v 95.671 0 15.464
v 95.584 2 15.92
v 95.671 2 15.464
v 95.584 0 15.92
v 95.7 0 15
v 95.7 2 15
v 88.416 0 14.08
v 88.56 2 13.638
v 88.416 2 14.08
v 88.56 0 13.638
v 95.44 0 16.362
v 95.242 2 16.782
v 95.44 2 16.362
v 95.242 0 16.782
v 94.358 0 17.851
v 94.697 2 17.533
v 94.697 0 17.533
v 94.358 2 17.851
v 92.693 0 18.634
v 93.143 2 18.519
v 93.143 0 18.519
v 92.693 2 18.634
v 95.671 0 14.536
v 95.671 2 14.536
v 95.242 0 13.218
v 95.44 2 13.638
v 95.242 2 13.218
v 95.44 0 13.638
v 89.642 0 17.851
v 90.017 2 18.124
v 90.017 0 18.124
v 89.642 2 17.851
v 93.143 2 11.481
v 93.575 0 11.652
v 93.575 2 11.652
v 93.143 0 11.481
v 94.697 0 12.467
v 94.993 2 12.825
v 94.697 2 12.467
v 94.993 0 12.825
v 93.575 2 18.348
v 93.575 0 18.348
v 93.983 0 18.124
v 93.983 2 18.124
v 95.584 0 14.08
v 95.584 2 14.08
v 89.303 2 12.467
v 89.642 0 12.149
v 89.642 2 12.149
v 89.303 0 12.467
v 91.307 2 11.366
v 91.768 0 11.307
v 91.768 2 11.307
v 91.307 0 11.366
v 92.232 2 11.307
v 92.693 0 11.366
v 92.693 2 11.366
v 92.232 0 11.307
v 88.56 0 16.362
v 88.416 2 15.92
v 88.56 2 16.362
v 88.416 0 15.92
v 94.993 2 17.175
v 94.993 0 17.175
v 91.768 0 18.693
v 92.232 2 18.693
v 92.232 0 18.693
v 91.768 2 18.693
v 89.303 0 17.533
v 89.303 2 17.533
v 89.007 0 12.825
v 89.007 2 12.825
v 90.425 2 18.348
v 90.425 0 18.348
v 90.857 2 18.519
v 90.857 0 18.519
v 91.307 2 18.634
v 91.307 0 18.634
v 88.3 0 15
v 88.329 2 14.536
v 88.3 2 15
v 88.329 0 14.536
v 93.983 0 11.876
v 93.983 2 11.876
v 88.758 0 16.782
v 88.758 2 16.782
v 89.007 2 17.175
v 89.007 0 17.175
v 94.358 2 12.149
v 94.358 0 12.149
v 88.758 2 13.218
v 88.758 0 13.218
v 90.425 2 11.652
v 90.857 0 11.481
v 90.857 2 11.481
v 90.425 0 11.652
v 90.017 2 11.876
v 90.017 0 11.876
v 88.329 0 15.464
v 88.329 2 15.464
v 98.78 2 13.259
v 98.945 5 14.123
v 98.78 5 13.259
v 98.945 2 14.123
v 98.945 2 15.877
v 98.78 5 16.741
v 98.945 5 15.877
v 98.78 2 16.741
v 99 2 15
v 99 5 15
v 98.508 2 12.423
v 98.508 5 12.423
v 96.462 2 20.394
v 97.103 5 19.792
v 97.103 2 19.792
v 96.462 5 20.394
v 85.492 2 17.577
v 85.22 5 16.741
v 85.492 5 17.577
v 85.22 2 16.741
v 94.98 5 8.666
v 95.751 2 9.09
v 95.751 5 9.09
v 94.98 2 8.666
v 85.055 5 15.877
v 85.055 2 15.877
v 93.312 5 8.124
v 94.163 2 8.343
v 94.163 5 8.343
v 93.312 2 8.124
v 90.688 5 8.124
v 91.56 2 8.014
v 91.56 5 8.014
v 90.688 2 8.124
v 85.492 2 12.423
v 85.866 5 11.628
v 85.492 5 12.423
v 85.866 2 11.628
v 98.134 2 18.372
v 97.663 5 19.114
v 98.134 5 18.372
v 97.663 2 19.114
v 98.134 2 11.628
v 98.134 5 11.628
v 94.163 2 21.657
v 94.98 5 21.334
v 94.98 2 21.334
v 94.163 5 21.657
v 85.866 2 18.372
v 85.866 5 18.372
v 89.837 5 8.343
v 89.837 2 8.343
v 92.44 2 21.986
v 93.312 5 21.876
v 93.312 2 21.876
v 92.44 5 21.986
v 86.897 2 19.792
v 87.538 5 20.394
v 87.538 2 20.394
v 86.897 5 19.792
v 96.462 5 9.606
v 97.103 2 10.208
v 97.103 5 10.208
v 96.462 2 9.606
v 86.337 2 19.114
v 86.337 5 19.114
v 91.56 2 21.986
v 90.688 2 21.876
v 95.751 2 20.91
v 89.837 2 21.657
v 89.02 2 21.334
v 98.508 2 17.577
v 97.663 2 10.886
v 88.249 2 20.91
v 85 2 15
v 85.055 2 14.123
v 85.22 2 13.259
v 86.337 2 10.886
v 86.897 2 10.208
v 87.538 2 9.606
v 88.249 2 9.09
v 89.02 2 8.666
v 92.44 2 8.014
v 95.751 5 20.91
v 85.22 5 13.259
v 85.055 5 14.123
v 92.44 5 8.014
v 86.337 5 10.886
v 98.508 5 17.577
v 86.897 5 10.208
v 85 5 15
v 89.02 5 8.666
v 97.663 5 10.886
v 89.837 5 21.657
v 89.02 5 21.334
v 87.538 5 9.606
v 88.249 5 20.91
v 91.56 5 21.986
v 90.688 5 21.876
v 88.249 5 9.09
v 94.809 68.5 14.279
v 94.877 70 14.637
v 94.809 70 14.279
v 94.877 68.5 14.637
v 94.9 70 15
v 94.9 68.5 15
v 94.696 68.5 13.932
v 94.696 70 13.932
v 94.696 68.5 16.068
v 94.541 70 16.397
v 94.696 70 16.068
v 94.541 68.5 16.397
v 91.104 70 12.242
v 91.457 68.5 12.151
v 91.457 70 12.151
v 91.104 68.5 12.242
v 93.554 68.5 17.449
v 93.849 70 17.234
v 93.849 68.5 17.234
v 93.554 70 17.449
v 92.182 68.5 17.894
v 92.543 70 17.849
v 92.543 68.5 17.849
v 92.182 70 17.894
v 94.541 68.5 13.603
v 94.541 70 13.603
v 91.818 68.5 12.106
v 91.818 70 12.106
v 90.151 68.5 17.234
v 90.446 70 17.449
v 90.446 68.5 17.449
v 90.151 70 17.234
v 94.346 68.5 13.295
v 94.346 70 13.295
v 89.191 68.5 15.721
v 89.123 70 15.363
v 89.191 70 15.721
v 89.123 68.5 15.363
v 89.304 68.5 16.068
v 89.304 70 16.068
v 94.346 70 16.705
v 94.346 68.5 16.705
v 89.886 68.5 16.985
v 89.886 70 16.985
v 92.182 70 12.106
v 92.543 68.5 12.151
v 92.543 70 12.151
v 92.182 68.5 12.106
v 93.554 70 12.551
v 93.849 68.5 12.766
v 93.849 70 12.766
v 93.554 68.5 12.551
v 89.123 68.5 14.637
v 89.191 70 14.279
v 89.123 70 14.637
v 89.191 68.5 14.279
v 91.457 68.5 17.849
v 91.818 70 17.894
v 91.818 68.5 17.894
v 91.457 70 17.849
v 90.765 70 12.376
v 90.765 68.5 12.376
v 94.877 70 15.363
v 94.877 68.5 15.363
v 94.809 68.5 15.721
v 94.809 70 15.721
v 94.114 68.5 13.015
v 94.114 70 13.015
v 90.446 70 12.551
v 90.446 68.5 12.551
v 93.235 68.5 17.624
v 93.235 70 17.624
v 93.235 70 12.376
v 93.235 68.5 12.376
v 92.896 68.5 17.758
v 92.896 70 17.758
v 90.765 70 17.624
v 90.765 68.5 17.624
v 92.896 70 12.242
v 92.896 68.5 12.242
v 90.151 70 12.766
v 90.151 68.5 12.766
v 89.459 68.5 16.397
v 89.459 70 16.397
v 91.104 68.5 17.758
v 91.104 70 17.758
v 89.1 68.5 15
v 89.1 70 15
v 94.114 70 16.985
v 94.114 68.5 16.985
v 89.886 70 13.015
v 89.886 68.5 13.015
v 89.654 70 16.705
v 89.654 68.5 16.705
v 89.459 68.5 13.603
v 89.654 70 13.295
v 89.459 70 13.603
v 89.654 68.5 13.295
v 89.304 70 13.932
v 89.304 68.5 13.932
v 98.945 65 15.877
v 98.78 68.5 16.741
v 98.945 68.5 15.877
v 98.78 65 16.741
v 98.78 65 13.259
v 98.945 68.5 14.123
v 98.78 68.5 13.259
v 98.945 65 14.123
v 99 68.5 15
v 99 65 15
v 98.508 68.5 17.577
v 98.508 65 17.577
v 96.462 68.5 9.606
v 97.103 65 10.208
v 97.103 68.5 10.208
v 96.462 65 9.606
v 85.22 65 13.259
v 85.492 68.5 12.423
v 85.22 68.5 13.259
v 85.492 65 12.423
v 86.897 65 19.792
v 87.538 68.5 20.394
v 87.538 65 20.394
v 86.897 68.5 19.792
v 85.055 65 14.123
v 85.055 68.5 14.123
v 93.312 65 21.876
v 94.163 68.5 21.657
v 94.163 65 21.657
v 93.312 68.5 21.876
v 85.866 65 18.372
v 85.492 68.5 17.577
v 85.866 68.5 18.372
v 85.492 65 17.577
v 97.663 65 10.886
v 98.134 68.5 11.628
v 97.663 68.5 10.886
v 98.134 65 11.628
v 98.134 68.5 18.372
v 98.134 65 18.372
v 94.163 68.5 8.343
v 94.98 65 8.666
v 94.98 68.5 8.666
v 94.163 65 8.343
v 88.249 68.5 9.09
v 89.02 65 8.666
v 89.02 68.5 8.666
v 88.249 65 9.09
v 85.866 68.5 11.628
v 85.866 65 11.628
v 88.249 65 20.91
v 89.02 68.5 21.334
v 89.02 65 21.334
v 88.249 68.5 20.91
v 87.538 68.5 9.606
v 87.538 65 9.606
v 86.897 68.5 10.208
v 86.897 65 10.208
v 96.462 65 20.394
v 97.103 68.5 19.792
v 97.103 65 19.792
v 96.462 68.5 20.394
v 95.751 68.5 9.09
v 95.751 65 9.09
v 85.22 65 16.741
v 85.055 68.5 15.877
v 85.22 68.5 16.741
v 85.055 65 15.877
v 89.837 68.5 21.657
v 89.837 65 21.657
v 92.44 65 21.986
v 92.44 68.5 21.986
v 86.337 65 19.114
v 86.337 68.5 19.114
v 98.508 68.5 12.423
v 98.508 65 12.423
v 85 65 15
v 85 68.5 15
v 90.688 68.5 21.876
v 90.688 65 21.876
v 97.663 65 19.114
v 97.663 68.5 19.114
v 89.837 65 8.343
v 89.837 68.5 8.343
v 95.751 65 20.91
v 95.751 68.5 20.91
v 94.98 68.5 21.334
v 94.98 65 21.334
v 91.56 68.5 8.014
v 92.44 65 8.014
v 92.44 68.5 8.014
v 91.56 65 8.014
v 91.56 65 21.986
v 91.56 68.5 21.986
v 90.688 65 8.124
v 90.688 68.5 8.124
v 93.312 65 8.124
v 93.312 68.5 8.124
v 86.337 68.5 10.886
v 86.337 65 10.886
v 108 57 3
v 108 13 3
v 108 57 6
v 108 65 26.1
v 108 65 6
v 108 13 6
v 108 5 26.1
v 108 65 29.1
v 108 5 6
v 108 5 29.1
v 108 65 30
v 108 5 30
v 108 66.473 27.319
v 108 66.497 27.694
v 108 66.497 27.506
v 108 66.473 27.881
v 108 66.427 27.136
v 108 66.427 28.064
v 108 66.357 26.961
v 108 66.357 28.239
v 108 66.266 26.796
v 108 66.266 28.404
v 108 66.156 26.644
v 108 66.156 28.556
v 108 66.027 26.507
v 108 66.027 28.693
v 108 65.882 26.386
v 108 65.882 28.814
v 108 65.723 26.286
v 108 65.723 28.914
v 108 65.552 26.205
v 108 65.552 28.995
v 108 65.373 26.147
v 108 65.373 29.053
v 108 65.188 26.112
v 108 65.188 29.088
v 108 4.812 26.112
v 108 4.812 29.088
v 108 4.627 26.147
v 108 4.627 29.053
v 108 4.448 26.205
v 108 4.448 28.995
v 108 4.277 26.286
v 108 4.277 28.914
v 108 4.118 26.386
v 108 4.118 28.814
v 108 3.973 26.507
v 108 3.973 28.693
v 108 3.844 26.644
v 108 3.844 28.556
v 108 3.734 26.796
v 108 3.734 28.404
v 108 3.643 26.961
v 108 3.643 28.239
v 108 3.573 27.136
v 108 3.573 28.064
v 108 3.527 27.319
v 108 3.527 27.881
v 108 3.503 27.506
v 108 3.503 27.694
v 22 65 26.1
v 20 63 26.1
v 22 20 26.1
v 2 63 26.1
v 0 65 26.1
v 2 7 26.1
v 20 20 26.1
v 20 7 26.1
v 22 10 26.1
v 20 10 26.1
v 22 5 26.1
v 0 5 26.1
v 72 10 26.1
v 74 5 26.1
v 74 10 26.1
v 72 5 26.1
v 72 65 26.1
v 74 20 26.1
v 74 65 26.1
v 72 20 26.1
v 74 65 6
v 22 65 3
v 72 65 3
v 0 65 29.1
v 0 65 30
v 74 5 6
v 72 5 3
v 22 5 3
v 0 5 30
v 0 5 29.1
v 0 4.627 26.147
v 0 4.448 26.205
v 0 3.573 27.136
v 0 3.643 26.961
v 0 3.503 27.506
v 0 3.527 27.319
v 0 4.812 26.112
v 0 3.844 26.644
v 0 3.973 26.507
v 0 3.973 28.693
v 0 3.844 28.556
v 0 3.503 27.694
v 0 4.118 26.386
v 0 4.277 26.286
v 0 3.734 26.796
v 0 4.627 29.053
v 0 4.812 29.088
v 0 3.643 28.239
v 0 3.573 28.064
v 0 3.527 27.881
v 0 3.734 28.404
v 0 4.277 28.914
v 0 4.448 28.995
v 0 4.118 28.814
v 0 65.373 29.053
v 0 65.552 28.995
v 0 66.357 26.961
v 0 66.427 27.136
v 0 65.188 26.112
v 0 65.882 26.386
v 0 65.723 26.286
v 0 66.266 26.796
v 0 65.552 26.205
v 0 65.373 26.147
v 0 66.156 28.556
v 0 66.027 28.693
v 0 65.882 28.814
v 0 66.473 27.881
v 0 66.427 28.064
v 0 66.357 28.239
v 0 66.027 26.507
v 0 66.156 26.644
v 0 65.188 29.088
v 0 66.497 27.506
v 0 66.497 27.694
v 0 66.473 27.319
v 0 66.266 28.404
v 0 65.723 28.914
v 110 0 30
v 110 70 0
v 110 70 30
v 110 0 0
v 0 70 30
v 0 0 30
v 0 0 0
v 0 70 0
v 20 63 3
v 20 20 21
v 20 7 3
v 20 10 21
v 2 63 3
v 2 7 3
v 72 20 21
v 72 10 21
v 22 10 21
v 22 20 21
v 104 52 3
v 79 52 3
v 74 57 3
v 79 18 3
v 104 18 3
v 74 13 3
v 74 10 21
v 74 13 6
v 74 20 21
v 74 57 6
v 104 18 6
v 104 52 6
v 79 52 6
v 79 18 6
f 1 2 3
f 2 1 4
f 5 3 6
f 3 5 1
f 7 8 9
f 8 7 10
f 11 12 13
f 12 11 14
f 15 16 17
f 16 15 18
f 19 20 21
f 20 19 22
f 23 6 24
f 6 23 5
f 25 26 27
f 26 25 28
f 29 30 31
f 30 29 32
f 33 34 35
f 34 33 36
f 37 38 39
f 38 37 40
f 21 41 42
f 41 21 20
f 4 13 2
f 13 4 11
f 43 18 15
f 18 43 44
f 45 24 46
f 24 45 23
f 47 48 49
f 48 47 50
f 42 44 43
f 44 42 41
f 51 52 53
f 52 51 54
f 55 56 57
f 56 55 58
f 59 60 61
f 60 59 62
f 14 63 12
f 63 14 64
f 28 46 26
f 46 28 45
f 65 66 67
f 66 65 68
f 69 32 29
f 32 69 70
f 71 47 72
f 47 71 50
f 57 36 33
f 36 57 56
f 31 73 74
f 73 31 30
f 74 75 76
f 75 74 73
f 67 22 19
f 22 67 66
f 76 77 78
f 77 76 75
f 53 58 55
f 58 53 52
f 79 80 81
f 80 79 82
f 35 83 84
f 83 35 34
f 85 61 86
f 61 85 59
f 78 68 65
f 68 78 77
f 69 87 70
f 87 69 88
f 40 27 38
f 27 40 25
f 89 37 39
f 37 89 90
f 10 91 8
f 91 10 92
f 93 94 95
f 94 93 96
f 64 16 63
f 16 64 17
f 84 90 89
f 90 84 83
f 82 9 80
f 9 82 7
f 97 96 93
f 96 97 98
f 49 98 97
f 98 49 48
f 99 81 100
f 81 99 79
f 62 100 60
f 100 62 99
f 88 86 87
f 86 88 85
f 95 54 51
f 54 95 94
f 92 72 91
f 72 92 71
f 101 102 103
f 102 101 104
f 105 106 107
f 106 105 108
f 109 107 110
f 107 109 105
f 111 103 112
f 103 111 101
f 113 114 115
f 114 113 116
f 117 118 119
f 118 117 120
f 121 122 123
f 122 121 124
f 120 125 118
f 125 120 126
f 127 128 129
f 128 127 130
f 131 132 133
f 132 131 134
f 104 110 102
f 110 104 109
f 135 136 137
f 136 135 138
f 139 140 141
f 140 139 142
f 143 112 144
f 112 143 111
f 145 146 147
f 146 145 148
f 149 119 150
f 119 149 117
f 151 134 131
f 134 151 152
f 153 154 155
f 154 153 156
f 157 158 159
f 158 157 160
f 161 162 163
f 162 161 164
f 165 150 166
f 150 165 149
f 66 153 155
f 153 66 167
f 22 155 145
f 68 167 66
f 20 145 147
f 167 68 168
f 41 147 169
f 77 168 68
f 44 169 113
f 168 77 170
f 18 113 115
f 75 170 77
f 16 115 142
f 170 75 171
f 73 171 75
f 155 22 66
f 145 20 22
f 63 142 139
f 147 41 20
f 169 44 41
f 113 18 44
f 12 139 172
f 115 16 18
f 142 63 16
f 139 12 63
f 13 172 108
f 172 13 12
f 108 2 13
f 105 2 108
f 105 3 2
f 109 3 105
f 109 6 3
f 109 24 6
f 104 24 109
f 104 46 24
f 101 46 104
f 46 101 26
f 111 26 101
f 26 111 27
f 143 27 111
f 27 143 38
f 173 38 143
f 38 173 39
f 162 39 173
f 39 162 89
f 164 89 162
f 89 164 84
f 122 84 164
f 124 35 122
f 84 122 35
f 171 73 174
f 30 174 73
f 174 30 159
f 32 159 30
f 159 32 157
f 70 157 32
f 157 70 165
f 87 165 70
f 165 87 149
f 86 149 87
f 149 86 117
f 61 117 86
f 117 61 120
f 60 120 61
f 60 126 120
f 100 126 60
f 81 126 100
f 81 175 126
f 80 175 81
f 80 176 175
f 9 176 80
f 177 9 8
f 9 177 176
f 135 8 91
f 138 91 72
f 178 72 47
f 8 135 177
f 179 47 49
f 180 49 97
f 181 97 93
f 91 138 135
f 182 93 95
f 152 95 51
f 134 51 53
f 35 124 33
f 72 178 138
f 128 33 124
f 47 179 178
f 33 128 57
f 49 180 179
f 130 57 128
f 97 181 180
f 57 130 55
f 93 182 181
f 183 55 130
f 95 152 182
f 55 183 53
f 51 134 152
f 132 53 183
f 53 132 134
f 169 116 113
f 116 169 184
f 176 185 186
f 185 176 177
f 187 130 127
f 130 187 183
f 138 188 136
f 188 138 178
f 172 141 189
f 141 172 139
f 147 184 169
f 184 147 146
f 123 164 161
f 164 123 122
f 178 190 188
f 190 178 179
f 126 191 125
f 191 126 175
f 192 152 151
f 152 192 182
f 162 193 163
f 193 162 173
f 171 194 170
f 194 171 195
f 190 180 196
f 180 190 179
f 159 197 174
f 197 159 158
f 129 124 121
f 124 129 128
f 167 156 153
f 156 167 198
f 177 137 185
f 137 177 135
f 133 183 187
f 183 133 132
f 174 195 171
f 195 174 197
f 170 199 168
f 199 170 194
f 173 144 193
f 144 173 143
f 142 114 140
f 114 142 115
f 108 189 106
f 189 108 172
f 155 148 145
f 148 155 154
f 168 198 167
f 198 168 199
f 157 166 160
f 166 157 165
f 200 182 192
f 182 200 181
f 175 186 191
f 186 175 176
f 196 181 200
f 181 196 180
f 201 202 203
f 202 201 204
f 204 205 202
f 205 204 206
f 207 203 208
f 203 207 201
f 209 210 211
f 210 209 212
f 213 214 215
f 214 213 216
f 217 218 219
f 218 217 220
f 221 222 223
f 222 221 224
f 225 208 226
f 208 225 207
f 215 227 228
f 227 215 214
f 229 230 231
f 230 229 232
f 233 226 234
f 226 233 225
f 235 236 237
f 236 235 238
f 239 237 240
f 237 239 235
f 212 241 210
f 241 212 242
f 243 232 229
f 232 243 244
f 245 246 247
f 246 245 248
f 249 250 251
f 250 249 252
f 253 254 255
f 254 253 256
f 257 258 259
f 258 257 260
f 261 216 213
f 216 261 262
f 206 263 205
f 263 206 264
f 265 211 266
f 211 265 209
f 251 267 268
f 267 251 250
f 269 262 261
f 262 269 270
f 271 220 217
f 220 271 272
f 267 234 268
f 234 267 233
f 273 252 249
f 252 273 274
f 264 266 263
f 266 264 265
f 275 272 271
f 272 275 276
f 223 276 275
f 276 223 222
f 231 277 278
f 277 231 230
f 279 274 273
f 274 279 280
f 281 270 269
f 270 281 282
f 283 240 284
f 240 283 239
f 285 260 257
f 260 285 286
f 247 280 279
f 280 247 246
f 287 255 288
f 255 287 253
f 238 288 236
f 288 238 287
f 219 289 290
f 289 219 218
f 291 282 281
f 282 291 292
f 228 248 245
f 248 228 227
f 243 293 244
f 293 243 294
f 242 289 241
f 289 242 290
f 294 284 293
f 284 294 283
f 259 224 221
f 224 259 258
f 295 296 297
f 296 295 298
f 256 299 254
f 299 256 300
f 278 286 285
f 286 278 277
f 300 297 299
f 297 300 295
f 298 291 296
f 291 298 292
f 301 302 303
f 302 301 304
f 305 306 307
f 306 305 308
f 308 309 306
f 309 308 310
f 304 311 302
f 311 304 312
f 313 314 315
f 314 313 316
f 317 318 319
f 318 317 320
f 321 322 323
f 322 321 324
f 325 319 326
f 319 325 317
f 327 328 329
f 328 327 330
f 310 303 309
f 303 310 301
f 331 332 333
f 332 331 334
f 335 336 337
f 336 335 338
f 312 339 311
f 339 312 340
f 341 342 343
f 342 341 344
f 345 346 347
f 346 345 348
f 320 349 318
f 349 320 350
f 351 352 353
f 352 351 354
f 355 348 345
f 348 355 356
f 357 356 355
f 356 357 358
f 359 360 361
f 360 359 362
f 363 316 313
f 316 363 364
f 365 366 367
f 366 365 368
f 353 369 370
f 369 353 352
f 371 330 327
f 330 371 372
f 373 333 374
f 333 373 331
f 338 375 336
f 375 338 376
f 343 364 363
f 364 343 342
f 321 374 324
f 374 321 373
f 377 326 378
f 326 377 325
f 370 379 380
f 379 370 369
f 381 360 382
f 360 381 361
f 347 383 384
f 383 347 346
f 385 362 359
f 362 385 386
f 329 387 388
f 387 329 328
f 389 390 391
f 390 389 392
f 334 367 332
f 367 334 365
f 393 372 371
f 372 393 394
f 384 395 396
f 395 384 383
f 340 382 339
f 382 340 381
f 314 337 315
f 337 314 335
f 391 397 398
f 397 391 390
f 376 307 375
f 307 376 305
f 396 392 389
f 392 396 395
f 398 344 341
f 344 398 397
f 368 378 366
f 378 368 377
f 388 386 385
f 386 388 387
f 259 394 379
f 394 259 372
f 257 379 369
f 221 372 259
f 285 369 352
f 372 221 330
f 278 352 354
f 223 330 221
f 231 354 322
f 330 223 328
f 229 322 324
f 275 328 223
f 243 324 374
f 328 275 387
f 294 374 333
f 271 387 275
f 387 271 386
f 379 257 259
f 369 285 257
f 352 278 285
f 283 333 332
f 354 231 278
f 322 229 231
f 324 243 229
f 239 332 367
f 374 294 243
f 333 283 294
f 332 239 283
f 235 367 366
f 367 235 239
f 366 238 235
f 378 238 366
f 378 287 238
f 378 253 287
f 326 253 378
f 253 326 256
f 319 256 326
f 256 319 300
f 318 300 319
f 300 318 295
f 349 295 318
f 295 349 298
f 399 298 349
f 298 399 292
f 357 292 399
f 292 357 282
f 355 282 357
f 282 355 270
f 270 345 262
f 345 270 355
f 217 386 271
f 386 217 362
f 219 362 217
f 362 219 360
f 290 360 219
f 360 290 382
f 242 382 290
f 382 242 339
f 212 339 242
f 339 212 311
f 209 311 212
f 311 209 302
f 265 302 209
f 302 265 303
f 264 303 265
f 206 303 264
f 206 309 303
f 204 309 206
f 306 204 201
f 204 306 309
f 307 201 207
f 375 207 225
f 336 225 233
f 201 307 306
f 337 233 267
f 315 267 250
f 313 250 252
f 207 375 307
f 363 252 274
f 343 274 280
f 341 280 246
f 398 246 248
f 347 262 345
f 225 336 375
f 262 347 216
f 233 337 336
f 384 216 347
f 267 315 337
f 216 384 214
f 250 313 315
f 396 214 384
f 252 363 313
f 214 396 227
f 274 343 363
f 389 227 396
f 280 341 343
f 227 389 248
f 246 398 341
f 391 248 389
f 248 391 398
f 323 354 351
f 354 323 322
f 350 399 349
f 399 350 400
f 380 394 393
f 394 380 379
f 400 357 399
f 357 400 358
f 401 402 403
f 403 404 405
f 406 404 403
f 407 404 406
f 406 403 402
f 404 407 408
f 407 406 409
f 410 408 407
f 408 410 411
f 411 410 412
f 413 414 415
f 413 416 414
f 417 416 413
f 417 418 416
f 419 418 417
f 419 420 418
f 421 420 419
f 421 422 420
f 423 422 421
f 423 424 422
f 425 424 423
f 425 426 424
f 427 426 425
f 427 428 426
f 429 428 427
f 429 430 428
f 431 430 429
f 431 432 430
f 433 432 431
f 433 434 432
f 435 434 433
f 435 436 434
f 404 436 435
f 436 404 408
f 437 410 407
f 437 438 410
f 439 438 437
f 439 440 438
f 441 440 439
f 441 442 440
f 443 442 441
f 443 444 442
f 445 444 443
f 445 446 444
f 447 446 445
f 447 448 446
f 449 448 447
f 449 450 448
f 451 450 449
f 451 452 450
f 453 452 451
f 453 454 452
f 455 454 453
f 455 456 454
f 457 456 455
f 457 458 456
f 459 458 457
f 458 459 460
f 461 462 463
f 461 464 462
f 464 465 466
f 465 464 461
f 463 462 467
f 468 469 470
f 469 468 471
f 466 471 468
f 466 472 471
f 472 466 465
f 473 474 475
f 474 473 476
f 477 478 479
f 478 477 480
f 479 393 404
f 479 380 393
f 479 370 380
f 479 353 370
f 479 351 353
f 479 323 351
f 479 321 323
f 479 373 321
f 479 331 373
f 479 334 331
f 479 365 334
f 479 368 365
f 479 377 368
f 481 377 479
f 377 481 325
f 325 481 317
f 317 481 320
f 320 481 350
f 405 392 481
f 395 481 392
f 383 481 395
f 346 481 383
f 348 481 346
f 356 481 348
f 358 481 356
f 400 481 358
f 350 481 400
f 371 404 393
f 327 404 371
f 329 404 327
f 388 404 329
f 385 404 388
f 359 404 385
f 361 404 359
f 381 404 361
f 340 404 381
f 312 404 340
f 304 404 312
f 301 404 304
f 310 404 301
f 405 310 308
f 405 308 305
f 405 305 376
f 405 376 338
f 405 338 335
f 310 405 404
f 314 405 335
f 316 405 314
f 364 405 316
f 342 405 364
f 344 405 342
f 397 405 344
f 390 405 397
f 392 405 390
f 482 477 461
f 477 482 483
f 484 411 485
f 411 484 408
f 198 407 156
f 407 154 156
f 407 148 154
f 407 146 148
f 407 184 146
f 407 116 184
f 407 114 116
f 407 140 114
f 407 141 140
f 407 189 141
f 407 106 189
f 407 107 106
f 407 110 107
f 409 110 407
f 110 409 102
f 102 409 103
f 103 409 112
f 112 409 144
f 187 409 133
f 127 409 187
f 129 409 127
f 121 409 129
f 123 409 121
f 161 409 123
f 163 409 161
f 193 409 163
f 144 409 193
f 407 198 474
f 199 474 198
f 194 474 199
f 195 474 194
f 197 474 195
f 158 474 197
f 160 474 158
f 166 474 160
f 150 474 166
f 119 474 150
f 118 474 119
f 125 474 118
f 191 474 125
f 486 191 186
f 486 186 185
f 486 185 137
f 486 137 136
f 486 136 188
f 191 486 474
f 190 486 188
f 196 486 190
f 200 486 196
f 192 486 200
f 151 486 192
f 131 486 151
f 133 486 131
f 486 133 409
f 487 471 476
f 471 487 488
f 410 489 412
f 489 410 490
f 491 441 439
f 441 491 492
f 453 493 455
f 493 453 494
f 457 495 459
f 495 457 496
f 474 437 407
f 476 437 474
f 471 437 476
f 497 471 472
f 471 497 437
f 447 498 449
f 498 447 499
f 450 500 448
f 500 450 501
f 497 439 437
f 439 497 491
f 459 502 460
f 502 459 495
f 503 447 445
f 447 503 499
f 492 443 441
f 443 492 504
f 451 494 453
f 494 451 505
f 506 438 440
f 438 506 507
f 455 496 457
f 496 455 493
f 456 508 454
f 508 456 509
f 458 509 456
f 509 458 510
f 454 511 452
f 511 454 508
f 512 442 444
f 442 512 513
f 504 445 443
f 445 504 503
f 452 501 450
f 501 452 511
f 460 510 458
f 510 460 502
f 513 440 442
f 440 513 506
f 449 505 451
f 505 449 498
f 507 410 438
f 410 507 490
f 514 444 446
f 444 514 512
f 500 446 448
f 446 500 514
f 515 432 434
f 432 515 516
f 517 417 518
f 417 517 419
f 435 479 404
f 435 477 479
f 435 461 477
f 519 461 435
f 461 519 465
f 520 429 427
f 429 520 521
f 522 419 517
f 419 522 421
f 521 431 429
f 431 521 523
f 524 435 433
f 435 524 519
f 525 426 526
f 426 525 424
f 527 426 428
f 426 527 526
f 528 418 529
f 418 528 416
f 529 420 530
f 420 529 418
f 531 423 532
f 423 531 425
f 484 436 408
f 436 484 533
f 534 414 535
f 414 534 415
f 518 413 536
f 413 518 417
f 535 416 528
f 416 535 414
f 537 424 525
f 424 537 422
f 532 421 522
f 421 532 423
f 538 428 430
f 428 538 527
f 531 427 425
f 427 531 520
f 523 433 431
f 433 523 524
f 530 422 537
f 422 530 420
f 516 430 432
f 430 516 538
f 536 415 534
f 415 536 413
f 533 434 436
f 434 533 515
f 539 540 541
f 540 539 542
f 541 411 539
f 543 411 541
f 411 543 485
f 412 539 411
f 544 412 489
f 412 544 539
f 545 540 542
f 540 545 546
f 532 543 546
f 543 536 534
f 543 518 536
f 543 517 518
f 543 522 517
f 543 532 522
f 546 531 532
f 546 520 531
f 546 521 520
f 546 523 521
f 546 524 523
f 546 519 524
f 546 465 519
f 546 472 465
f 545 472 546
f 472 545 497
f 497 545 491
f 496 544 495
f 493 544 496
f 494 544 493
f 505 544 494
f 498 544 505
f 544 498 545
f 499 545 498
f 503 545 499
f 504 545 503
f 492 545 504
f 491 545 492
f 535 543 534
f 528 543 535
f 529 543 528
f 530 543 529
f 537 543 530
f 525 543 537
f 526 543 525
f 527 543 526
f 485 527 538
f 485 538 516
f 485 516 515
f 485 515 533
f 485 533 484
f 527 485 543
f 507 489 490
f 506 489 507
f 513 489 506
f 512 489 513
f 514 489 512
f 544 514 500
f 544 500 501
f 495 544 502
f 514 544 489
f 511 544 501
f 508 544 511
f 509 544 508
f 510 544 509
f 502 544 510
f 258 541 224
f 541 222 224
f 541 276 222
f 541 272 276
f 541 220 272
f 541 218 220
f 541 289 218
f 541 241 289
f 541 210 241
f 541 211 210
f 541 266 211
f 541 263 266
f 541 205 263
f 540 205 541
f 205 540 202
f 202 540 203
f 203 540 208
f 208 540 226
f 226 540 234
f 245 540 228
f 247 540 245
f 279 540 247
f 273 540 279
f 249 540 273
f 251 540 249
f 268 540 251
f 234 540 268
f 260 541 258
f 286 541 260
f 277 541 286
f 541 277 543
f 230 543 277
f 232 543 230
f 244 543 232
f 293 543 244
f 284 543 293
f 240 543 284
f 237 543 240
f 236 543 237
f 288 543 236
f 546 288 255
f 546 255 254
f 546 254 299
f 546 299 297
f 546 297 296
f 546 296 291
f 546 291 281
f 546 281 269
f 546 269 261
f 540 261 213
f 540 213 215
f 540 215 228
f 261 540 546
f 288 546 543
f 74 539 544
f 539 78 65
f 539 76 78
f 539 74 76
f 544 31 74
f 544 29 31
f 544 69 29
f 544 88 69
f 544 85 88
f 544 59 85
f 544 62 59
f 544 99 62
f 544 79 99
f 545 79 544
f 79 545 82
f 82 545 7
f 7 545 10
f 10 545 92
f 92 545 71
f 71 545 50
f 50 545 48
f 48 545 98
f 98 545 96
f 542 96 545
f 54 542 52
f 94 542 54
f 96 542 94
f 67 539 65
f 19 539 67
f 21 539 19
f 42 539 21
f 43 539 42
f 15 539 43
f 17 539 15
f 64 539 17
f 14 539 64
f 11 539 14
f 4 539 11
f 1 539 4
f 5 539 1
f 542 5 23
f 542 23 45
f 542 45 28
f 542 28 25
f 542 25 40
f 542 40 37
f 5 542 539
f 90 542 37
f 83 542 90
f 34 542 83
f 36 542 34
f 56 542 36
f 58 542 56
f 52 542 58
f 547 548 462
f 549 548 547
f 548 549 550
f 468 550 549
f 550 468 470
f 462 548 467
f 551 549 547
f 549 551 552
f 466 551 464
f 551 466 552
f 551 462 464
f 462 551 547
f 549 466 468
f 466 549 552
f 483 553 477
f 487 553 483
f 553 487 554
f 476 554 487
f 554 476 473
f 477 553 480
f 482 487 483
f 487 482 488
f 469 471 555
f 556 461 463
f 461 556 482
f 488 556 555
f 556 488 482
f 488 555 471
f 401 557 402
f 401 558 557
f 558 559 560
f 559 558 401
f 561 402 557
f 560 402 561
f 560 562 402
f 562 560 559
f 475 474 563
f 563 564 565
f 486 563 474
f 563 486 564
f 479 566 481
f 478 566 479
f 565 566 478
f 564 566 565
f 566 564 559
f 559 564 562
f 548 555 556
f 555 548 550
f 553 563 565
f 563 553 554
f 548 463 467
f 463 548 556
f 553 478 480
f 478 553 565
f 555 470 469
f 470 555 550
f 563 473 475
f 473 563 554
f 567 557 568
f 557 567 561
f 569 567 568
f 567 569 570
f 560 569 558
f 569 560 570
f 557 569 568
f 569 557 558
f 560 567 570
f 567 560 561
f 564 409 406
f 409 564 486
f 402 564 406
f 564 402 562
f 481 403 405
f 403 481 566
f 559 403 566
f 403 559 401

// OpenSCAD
coil_w = 2;
coil_h = 34;
coil_l = 43;

rfid_l = 45;
rfid_w = 24;
rfid_h = 15;

ninev_l = 56;
ninev_w = 27.5;
ninev_h = 18;

pcb_w = 50;
pcb_l = 25;
pcb_h = 60;

h = 25;
w = 60;
l = 105; 
side = 10;

module cover() {
  translate([-2, side / 2, (h + 5) - 3.9]) {
    cube([l + 5, w, 4]);
    translate([0, 0, 1.5])
    rotate( v = [0,1,0], a = 90 ) {
      cylinder(l + 5, r = 1.5, $fn=50 );
    }
    translate([0, w, 1.5])
    rotate( v = [0,1,0], a = 90 ) {
      cylinder(l + 5, r = 1.5, $fn=50 );
    }
  }
}

module case() {
  difference() {
    cube([l + 5, w + side, h + 5]);

    translate([2, ((w + side) - ninev_l)/2, 3])
    cube([ninev_h, ninev_l, 100]);
  
    translate([4 + ninev_h, ((w + side) - pcb_h)/2, 3])
    cube([pcb_w, pcb_h, 100]);

    translate([6 + ninev_h + pcb_w, ((w + side) - pcb_h)/2, 3])
    cube([coil_h, pcb_h, 100]);

    // hole through walls
    translate([5, 10, h-4])
    cube([80, 10, 10]);
  
    // buttons
    translate([6 + ninev_h + pcb_w + 18, ((w + side) - pcb_h)/2 + 7, 15])
    rotate( v = [1,0,0], a = 90 ) {
      cylinder(30, r = 3.7, $fn=50 );
      cylinder(10, r = 7, $fn=50 );
    }
    translate([6 + ninev_h + pcb_w + 18, ((w + side) - pcb_h)/2 + 63, 15])
    rotate(v=[1, 0, 0], a=270) {
      cylinder(h = 20, r = 2.9, $fn = 50);
      translate([0, 0, -4.5])
      cylinder(h = 5, r = 7, $fn = 50);
    }
  
    cover();
  };

  translate([6 + ninev_h + pcb_w + 5, ((w + side) - 34)/2, 3])
  cube([25, 34, 3]);

  translate([6 + ninev_h + pcb_w, side/2, 3])
  cube([coil_h, 8, 3]);

  translate([6 + ninev_h + pcb_w, (w + side) - (side/2) - 8, 3])
  cube([coil_h, 8, 3]);
}

case();
